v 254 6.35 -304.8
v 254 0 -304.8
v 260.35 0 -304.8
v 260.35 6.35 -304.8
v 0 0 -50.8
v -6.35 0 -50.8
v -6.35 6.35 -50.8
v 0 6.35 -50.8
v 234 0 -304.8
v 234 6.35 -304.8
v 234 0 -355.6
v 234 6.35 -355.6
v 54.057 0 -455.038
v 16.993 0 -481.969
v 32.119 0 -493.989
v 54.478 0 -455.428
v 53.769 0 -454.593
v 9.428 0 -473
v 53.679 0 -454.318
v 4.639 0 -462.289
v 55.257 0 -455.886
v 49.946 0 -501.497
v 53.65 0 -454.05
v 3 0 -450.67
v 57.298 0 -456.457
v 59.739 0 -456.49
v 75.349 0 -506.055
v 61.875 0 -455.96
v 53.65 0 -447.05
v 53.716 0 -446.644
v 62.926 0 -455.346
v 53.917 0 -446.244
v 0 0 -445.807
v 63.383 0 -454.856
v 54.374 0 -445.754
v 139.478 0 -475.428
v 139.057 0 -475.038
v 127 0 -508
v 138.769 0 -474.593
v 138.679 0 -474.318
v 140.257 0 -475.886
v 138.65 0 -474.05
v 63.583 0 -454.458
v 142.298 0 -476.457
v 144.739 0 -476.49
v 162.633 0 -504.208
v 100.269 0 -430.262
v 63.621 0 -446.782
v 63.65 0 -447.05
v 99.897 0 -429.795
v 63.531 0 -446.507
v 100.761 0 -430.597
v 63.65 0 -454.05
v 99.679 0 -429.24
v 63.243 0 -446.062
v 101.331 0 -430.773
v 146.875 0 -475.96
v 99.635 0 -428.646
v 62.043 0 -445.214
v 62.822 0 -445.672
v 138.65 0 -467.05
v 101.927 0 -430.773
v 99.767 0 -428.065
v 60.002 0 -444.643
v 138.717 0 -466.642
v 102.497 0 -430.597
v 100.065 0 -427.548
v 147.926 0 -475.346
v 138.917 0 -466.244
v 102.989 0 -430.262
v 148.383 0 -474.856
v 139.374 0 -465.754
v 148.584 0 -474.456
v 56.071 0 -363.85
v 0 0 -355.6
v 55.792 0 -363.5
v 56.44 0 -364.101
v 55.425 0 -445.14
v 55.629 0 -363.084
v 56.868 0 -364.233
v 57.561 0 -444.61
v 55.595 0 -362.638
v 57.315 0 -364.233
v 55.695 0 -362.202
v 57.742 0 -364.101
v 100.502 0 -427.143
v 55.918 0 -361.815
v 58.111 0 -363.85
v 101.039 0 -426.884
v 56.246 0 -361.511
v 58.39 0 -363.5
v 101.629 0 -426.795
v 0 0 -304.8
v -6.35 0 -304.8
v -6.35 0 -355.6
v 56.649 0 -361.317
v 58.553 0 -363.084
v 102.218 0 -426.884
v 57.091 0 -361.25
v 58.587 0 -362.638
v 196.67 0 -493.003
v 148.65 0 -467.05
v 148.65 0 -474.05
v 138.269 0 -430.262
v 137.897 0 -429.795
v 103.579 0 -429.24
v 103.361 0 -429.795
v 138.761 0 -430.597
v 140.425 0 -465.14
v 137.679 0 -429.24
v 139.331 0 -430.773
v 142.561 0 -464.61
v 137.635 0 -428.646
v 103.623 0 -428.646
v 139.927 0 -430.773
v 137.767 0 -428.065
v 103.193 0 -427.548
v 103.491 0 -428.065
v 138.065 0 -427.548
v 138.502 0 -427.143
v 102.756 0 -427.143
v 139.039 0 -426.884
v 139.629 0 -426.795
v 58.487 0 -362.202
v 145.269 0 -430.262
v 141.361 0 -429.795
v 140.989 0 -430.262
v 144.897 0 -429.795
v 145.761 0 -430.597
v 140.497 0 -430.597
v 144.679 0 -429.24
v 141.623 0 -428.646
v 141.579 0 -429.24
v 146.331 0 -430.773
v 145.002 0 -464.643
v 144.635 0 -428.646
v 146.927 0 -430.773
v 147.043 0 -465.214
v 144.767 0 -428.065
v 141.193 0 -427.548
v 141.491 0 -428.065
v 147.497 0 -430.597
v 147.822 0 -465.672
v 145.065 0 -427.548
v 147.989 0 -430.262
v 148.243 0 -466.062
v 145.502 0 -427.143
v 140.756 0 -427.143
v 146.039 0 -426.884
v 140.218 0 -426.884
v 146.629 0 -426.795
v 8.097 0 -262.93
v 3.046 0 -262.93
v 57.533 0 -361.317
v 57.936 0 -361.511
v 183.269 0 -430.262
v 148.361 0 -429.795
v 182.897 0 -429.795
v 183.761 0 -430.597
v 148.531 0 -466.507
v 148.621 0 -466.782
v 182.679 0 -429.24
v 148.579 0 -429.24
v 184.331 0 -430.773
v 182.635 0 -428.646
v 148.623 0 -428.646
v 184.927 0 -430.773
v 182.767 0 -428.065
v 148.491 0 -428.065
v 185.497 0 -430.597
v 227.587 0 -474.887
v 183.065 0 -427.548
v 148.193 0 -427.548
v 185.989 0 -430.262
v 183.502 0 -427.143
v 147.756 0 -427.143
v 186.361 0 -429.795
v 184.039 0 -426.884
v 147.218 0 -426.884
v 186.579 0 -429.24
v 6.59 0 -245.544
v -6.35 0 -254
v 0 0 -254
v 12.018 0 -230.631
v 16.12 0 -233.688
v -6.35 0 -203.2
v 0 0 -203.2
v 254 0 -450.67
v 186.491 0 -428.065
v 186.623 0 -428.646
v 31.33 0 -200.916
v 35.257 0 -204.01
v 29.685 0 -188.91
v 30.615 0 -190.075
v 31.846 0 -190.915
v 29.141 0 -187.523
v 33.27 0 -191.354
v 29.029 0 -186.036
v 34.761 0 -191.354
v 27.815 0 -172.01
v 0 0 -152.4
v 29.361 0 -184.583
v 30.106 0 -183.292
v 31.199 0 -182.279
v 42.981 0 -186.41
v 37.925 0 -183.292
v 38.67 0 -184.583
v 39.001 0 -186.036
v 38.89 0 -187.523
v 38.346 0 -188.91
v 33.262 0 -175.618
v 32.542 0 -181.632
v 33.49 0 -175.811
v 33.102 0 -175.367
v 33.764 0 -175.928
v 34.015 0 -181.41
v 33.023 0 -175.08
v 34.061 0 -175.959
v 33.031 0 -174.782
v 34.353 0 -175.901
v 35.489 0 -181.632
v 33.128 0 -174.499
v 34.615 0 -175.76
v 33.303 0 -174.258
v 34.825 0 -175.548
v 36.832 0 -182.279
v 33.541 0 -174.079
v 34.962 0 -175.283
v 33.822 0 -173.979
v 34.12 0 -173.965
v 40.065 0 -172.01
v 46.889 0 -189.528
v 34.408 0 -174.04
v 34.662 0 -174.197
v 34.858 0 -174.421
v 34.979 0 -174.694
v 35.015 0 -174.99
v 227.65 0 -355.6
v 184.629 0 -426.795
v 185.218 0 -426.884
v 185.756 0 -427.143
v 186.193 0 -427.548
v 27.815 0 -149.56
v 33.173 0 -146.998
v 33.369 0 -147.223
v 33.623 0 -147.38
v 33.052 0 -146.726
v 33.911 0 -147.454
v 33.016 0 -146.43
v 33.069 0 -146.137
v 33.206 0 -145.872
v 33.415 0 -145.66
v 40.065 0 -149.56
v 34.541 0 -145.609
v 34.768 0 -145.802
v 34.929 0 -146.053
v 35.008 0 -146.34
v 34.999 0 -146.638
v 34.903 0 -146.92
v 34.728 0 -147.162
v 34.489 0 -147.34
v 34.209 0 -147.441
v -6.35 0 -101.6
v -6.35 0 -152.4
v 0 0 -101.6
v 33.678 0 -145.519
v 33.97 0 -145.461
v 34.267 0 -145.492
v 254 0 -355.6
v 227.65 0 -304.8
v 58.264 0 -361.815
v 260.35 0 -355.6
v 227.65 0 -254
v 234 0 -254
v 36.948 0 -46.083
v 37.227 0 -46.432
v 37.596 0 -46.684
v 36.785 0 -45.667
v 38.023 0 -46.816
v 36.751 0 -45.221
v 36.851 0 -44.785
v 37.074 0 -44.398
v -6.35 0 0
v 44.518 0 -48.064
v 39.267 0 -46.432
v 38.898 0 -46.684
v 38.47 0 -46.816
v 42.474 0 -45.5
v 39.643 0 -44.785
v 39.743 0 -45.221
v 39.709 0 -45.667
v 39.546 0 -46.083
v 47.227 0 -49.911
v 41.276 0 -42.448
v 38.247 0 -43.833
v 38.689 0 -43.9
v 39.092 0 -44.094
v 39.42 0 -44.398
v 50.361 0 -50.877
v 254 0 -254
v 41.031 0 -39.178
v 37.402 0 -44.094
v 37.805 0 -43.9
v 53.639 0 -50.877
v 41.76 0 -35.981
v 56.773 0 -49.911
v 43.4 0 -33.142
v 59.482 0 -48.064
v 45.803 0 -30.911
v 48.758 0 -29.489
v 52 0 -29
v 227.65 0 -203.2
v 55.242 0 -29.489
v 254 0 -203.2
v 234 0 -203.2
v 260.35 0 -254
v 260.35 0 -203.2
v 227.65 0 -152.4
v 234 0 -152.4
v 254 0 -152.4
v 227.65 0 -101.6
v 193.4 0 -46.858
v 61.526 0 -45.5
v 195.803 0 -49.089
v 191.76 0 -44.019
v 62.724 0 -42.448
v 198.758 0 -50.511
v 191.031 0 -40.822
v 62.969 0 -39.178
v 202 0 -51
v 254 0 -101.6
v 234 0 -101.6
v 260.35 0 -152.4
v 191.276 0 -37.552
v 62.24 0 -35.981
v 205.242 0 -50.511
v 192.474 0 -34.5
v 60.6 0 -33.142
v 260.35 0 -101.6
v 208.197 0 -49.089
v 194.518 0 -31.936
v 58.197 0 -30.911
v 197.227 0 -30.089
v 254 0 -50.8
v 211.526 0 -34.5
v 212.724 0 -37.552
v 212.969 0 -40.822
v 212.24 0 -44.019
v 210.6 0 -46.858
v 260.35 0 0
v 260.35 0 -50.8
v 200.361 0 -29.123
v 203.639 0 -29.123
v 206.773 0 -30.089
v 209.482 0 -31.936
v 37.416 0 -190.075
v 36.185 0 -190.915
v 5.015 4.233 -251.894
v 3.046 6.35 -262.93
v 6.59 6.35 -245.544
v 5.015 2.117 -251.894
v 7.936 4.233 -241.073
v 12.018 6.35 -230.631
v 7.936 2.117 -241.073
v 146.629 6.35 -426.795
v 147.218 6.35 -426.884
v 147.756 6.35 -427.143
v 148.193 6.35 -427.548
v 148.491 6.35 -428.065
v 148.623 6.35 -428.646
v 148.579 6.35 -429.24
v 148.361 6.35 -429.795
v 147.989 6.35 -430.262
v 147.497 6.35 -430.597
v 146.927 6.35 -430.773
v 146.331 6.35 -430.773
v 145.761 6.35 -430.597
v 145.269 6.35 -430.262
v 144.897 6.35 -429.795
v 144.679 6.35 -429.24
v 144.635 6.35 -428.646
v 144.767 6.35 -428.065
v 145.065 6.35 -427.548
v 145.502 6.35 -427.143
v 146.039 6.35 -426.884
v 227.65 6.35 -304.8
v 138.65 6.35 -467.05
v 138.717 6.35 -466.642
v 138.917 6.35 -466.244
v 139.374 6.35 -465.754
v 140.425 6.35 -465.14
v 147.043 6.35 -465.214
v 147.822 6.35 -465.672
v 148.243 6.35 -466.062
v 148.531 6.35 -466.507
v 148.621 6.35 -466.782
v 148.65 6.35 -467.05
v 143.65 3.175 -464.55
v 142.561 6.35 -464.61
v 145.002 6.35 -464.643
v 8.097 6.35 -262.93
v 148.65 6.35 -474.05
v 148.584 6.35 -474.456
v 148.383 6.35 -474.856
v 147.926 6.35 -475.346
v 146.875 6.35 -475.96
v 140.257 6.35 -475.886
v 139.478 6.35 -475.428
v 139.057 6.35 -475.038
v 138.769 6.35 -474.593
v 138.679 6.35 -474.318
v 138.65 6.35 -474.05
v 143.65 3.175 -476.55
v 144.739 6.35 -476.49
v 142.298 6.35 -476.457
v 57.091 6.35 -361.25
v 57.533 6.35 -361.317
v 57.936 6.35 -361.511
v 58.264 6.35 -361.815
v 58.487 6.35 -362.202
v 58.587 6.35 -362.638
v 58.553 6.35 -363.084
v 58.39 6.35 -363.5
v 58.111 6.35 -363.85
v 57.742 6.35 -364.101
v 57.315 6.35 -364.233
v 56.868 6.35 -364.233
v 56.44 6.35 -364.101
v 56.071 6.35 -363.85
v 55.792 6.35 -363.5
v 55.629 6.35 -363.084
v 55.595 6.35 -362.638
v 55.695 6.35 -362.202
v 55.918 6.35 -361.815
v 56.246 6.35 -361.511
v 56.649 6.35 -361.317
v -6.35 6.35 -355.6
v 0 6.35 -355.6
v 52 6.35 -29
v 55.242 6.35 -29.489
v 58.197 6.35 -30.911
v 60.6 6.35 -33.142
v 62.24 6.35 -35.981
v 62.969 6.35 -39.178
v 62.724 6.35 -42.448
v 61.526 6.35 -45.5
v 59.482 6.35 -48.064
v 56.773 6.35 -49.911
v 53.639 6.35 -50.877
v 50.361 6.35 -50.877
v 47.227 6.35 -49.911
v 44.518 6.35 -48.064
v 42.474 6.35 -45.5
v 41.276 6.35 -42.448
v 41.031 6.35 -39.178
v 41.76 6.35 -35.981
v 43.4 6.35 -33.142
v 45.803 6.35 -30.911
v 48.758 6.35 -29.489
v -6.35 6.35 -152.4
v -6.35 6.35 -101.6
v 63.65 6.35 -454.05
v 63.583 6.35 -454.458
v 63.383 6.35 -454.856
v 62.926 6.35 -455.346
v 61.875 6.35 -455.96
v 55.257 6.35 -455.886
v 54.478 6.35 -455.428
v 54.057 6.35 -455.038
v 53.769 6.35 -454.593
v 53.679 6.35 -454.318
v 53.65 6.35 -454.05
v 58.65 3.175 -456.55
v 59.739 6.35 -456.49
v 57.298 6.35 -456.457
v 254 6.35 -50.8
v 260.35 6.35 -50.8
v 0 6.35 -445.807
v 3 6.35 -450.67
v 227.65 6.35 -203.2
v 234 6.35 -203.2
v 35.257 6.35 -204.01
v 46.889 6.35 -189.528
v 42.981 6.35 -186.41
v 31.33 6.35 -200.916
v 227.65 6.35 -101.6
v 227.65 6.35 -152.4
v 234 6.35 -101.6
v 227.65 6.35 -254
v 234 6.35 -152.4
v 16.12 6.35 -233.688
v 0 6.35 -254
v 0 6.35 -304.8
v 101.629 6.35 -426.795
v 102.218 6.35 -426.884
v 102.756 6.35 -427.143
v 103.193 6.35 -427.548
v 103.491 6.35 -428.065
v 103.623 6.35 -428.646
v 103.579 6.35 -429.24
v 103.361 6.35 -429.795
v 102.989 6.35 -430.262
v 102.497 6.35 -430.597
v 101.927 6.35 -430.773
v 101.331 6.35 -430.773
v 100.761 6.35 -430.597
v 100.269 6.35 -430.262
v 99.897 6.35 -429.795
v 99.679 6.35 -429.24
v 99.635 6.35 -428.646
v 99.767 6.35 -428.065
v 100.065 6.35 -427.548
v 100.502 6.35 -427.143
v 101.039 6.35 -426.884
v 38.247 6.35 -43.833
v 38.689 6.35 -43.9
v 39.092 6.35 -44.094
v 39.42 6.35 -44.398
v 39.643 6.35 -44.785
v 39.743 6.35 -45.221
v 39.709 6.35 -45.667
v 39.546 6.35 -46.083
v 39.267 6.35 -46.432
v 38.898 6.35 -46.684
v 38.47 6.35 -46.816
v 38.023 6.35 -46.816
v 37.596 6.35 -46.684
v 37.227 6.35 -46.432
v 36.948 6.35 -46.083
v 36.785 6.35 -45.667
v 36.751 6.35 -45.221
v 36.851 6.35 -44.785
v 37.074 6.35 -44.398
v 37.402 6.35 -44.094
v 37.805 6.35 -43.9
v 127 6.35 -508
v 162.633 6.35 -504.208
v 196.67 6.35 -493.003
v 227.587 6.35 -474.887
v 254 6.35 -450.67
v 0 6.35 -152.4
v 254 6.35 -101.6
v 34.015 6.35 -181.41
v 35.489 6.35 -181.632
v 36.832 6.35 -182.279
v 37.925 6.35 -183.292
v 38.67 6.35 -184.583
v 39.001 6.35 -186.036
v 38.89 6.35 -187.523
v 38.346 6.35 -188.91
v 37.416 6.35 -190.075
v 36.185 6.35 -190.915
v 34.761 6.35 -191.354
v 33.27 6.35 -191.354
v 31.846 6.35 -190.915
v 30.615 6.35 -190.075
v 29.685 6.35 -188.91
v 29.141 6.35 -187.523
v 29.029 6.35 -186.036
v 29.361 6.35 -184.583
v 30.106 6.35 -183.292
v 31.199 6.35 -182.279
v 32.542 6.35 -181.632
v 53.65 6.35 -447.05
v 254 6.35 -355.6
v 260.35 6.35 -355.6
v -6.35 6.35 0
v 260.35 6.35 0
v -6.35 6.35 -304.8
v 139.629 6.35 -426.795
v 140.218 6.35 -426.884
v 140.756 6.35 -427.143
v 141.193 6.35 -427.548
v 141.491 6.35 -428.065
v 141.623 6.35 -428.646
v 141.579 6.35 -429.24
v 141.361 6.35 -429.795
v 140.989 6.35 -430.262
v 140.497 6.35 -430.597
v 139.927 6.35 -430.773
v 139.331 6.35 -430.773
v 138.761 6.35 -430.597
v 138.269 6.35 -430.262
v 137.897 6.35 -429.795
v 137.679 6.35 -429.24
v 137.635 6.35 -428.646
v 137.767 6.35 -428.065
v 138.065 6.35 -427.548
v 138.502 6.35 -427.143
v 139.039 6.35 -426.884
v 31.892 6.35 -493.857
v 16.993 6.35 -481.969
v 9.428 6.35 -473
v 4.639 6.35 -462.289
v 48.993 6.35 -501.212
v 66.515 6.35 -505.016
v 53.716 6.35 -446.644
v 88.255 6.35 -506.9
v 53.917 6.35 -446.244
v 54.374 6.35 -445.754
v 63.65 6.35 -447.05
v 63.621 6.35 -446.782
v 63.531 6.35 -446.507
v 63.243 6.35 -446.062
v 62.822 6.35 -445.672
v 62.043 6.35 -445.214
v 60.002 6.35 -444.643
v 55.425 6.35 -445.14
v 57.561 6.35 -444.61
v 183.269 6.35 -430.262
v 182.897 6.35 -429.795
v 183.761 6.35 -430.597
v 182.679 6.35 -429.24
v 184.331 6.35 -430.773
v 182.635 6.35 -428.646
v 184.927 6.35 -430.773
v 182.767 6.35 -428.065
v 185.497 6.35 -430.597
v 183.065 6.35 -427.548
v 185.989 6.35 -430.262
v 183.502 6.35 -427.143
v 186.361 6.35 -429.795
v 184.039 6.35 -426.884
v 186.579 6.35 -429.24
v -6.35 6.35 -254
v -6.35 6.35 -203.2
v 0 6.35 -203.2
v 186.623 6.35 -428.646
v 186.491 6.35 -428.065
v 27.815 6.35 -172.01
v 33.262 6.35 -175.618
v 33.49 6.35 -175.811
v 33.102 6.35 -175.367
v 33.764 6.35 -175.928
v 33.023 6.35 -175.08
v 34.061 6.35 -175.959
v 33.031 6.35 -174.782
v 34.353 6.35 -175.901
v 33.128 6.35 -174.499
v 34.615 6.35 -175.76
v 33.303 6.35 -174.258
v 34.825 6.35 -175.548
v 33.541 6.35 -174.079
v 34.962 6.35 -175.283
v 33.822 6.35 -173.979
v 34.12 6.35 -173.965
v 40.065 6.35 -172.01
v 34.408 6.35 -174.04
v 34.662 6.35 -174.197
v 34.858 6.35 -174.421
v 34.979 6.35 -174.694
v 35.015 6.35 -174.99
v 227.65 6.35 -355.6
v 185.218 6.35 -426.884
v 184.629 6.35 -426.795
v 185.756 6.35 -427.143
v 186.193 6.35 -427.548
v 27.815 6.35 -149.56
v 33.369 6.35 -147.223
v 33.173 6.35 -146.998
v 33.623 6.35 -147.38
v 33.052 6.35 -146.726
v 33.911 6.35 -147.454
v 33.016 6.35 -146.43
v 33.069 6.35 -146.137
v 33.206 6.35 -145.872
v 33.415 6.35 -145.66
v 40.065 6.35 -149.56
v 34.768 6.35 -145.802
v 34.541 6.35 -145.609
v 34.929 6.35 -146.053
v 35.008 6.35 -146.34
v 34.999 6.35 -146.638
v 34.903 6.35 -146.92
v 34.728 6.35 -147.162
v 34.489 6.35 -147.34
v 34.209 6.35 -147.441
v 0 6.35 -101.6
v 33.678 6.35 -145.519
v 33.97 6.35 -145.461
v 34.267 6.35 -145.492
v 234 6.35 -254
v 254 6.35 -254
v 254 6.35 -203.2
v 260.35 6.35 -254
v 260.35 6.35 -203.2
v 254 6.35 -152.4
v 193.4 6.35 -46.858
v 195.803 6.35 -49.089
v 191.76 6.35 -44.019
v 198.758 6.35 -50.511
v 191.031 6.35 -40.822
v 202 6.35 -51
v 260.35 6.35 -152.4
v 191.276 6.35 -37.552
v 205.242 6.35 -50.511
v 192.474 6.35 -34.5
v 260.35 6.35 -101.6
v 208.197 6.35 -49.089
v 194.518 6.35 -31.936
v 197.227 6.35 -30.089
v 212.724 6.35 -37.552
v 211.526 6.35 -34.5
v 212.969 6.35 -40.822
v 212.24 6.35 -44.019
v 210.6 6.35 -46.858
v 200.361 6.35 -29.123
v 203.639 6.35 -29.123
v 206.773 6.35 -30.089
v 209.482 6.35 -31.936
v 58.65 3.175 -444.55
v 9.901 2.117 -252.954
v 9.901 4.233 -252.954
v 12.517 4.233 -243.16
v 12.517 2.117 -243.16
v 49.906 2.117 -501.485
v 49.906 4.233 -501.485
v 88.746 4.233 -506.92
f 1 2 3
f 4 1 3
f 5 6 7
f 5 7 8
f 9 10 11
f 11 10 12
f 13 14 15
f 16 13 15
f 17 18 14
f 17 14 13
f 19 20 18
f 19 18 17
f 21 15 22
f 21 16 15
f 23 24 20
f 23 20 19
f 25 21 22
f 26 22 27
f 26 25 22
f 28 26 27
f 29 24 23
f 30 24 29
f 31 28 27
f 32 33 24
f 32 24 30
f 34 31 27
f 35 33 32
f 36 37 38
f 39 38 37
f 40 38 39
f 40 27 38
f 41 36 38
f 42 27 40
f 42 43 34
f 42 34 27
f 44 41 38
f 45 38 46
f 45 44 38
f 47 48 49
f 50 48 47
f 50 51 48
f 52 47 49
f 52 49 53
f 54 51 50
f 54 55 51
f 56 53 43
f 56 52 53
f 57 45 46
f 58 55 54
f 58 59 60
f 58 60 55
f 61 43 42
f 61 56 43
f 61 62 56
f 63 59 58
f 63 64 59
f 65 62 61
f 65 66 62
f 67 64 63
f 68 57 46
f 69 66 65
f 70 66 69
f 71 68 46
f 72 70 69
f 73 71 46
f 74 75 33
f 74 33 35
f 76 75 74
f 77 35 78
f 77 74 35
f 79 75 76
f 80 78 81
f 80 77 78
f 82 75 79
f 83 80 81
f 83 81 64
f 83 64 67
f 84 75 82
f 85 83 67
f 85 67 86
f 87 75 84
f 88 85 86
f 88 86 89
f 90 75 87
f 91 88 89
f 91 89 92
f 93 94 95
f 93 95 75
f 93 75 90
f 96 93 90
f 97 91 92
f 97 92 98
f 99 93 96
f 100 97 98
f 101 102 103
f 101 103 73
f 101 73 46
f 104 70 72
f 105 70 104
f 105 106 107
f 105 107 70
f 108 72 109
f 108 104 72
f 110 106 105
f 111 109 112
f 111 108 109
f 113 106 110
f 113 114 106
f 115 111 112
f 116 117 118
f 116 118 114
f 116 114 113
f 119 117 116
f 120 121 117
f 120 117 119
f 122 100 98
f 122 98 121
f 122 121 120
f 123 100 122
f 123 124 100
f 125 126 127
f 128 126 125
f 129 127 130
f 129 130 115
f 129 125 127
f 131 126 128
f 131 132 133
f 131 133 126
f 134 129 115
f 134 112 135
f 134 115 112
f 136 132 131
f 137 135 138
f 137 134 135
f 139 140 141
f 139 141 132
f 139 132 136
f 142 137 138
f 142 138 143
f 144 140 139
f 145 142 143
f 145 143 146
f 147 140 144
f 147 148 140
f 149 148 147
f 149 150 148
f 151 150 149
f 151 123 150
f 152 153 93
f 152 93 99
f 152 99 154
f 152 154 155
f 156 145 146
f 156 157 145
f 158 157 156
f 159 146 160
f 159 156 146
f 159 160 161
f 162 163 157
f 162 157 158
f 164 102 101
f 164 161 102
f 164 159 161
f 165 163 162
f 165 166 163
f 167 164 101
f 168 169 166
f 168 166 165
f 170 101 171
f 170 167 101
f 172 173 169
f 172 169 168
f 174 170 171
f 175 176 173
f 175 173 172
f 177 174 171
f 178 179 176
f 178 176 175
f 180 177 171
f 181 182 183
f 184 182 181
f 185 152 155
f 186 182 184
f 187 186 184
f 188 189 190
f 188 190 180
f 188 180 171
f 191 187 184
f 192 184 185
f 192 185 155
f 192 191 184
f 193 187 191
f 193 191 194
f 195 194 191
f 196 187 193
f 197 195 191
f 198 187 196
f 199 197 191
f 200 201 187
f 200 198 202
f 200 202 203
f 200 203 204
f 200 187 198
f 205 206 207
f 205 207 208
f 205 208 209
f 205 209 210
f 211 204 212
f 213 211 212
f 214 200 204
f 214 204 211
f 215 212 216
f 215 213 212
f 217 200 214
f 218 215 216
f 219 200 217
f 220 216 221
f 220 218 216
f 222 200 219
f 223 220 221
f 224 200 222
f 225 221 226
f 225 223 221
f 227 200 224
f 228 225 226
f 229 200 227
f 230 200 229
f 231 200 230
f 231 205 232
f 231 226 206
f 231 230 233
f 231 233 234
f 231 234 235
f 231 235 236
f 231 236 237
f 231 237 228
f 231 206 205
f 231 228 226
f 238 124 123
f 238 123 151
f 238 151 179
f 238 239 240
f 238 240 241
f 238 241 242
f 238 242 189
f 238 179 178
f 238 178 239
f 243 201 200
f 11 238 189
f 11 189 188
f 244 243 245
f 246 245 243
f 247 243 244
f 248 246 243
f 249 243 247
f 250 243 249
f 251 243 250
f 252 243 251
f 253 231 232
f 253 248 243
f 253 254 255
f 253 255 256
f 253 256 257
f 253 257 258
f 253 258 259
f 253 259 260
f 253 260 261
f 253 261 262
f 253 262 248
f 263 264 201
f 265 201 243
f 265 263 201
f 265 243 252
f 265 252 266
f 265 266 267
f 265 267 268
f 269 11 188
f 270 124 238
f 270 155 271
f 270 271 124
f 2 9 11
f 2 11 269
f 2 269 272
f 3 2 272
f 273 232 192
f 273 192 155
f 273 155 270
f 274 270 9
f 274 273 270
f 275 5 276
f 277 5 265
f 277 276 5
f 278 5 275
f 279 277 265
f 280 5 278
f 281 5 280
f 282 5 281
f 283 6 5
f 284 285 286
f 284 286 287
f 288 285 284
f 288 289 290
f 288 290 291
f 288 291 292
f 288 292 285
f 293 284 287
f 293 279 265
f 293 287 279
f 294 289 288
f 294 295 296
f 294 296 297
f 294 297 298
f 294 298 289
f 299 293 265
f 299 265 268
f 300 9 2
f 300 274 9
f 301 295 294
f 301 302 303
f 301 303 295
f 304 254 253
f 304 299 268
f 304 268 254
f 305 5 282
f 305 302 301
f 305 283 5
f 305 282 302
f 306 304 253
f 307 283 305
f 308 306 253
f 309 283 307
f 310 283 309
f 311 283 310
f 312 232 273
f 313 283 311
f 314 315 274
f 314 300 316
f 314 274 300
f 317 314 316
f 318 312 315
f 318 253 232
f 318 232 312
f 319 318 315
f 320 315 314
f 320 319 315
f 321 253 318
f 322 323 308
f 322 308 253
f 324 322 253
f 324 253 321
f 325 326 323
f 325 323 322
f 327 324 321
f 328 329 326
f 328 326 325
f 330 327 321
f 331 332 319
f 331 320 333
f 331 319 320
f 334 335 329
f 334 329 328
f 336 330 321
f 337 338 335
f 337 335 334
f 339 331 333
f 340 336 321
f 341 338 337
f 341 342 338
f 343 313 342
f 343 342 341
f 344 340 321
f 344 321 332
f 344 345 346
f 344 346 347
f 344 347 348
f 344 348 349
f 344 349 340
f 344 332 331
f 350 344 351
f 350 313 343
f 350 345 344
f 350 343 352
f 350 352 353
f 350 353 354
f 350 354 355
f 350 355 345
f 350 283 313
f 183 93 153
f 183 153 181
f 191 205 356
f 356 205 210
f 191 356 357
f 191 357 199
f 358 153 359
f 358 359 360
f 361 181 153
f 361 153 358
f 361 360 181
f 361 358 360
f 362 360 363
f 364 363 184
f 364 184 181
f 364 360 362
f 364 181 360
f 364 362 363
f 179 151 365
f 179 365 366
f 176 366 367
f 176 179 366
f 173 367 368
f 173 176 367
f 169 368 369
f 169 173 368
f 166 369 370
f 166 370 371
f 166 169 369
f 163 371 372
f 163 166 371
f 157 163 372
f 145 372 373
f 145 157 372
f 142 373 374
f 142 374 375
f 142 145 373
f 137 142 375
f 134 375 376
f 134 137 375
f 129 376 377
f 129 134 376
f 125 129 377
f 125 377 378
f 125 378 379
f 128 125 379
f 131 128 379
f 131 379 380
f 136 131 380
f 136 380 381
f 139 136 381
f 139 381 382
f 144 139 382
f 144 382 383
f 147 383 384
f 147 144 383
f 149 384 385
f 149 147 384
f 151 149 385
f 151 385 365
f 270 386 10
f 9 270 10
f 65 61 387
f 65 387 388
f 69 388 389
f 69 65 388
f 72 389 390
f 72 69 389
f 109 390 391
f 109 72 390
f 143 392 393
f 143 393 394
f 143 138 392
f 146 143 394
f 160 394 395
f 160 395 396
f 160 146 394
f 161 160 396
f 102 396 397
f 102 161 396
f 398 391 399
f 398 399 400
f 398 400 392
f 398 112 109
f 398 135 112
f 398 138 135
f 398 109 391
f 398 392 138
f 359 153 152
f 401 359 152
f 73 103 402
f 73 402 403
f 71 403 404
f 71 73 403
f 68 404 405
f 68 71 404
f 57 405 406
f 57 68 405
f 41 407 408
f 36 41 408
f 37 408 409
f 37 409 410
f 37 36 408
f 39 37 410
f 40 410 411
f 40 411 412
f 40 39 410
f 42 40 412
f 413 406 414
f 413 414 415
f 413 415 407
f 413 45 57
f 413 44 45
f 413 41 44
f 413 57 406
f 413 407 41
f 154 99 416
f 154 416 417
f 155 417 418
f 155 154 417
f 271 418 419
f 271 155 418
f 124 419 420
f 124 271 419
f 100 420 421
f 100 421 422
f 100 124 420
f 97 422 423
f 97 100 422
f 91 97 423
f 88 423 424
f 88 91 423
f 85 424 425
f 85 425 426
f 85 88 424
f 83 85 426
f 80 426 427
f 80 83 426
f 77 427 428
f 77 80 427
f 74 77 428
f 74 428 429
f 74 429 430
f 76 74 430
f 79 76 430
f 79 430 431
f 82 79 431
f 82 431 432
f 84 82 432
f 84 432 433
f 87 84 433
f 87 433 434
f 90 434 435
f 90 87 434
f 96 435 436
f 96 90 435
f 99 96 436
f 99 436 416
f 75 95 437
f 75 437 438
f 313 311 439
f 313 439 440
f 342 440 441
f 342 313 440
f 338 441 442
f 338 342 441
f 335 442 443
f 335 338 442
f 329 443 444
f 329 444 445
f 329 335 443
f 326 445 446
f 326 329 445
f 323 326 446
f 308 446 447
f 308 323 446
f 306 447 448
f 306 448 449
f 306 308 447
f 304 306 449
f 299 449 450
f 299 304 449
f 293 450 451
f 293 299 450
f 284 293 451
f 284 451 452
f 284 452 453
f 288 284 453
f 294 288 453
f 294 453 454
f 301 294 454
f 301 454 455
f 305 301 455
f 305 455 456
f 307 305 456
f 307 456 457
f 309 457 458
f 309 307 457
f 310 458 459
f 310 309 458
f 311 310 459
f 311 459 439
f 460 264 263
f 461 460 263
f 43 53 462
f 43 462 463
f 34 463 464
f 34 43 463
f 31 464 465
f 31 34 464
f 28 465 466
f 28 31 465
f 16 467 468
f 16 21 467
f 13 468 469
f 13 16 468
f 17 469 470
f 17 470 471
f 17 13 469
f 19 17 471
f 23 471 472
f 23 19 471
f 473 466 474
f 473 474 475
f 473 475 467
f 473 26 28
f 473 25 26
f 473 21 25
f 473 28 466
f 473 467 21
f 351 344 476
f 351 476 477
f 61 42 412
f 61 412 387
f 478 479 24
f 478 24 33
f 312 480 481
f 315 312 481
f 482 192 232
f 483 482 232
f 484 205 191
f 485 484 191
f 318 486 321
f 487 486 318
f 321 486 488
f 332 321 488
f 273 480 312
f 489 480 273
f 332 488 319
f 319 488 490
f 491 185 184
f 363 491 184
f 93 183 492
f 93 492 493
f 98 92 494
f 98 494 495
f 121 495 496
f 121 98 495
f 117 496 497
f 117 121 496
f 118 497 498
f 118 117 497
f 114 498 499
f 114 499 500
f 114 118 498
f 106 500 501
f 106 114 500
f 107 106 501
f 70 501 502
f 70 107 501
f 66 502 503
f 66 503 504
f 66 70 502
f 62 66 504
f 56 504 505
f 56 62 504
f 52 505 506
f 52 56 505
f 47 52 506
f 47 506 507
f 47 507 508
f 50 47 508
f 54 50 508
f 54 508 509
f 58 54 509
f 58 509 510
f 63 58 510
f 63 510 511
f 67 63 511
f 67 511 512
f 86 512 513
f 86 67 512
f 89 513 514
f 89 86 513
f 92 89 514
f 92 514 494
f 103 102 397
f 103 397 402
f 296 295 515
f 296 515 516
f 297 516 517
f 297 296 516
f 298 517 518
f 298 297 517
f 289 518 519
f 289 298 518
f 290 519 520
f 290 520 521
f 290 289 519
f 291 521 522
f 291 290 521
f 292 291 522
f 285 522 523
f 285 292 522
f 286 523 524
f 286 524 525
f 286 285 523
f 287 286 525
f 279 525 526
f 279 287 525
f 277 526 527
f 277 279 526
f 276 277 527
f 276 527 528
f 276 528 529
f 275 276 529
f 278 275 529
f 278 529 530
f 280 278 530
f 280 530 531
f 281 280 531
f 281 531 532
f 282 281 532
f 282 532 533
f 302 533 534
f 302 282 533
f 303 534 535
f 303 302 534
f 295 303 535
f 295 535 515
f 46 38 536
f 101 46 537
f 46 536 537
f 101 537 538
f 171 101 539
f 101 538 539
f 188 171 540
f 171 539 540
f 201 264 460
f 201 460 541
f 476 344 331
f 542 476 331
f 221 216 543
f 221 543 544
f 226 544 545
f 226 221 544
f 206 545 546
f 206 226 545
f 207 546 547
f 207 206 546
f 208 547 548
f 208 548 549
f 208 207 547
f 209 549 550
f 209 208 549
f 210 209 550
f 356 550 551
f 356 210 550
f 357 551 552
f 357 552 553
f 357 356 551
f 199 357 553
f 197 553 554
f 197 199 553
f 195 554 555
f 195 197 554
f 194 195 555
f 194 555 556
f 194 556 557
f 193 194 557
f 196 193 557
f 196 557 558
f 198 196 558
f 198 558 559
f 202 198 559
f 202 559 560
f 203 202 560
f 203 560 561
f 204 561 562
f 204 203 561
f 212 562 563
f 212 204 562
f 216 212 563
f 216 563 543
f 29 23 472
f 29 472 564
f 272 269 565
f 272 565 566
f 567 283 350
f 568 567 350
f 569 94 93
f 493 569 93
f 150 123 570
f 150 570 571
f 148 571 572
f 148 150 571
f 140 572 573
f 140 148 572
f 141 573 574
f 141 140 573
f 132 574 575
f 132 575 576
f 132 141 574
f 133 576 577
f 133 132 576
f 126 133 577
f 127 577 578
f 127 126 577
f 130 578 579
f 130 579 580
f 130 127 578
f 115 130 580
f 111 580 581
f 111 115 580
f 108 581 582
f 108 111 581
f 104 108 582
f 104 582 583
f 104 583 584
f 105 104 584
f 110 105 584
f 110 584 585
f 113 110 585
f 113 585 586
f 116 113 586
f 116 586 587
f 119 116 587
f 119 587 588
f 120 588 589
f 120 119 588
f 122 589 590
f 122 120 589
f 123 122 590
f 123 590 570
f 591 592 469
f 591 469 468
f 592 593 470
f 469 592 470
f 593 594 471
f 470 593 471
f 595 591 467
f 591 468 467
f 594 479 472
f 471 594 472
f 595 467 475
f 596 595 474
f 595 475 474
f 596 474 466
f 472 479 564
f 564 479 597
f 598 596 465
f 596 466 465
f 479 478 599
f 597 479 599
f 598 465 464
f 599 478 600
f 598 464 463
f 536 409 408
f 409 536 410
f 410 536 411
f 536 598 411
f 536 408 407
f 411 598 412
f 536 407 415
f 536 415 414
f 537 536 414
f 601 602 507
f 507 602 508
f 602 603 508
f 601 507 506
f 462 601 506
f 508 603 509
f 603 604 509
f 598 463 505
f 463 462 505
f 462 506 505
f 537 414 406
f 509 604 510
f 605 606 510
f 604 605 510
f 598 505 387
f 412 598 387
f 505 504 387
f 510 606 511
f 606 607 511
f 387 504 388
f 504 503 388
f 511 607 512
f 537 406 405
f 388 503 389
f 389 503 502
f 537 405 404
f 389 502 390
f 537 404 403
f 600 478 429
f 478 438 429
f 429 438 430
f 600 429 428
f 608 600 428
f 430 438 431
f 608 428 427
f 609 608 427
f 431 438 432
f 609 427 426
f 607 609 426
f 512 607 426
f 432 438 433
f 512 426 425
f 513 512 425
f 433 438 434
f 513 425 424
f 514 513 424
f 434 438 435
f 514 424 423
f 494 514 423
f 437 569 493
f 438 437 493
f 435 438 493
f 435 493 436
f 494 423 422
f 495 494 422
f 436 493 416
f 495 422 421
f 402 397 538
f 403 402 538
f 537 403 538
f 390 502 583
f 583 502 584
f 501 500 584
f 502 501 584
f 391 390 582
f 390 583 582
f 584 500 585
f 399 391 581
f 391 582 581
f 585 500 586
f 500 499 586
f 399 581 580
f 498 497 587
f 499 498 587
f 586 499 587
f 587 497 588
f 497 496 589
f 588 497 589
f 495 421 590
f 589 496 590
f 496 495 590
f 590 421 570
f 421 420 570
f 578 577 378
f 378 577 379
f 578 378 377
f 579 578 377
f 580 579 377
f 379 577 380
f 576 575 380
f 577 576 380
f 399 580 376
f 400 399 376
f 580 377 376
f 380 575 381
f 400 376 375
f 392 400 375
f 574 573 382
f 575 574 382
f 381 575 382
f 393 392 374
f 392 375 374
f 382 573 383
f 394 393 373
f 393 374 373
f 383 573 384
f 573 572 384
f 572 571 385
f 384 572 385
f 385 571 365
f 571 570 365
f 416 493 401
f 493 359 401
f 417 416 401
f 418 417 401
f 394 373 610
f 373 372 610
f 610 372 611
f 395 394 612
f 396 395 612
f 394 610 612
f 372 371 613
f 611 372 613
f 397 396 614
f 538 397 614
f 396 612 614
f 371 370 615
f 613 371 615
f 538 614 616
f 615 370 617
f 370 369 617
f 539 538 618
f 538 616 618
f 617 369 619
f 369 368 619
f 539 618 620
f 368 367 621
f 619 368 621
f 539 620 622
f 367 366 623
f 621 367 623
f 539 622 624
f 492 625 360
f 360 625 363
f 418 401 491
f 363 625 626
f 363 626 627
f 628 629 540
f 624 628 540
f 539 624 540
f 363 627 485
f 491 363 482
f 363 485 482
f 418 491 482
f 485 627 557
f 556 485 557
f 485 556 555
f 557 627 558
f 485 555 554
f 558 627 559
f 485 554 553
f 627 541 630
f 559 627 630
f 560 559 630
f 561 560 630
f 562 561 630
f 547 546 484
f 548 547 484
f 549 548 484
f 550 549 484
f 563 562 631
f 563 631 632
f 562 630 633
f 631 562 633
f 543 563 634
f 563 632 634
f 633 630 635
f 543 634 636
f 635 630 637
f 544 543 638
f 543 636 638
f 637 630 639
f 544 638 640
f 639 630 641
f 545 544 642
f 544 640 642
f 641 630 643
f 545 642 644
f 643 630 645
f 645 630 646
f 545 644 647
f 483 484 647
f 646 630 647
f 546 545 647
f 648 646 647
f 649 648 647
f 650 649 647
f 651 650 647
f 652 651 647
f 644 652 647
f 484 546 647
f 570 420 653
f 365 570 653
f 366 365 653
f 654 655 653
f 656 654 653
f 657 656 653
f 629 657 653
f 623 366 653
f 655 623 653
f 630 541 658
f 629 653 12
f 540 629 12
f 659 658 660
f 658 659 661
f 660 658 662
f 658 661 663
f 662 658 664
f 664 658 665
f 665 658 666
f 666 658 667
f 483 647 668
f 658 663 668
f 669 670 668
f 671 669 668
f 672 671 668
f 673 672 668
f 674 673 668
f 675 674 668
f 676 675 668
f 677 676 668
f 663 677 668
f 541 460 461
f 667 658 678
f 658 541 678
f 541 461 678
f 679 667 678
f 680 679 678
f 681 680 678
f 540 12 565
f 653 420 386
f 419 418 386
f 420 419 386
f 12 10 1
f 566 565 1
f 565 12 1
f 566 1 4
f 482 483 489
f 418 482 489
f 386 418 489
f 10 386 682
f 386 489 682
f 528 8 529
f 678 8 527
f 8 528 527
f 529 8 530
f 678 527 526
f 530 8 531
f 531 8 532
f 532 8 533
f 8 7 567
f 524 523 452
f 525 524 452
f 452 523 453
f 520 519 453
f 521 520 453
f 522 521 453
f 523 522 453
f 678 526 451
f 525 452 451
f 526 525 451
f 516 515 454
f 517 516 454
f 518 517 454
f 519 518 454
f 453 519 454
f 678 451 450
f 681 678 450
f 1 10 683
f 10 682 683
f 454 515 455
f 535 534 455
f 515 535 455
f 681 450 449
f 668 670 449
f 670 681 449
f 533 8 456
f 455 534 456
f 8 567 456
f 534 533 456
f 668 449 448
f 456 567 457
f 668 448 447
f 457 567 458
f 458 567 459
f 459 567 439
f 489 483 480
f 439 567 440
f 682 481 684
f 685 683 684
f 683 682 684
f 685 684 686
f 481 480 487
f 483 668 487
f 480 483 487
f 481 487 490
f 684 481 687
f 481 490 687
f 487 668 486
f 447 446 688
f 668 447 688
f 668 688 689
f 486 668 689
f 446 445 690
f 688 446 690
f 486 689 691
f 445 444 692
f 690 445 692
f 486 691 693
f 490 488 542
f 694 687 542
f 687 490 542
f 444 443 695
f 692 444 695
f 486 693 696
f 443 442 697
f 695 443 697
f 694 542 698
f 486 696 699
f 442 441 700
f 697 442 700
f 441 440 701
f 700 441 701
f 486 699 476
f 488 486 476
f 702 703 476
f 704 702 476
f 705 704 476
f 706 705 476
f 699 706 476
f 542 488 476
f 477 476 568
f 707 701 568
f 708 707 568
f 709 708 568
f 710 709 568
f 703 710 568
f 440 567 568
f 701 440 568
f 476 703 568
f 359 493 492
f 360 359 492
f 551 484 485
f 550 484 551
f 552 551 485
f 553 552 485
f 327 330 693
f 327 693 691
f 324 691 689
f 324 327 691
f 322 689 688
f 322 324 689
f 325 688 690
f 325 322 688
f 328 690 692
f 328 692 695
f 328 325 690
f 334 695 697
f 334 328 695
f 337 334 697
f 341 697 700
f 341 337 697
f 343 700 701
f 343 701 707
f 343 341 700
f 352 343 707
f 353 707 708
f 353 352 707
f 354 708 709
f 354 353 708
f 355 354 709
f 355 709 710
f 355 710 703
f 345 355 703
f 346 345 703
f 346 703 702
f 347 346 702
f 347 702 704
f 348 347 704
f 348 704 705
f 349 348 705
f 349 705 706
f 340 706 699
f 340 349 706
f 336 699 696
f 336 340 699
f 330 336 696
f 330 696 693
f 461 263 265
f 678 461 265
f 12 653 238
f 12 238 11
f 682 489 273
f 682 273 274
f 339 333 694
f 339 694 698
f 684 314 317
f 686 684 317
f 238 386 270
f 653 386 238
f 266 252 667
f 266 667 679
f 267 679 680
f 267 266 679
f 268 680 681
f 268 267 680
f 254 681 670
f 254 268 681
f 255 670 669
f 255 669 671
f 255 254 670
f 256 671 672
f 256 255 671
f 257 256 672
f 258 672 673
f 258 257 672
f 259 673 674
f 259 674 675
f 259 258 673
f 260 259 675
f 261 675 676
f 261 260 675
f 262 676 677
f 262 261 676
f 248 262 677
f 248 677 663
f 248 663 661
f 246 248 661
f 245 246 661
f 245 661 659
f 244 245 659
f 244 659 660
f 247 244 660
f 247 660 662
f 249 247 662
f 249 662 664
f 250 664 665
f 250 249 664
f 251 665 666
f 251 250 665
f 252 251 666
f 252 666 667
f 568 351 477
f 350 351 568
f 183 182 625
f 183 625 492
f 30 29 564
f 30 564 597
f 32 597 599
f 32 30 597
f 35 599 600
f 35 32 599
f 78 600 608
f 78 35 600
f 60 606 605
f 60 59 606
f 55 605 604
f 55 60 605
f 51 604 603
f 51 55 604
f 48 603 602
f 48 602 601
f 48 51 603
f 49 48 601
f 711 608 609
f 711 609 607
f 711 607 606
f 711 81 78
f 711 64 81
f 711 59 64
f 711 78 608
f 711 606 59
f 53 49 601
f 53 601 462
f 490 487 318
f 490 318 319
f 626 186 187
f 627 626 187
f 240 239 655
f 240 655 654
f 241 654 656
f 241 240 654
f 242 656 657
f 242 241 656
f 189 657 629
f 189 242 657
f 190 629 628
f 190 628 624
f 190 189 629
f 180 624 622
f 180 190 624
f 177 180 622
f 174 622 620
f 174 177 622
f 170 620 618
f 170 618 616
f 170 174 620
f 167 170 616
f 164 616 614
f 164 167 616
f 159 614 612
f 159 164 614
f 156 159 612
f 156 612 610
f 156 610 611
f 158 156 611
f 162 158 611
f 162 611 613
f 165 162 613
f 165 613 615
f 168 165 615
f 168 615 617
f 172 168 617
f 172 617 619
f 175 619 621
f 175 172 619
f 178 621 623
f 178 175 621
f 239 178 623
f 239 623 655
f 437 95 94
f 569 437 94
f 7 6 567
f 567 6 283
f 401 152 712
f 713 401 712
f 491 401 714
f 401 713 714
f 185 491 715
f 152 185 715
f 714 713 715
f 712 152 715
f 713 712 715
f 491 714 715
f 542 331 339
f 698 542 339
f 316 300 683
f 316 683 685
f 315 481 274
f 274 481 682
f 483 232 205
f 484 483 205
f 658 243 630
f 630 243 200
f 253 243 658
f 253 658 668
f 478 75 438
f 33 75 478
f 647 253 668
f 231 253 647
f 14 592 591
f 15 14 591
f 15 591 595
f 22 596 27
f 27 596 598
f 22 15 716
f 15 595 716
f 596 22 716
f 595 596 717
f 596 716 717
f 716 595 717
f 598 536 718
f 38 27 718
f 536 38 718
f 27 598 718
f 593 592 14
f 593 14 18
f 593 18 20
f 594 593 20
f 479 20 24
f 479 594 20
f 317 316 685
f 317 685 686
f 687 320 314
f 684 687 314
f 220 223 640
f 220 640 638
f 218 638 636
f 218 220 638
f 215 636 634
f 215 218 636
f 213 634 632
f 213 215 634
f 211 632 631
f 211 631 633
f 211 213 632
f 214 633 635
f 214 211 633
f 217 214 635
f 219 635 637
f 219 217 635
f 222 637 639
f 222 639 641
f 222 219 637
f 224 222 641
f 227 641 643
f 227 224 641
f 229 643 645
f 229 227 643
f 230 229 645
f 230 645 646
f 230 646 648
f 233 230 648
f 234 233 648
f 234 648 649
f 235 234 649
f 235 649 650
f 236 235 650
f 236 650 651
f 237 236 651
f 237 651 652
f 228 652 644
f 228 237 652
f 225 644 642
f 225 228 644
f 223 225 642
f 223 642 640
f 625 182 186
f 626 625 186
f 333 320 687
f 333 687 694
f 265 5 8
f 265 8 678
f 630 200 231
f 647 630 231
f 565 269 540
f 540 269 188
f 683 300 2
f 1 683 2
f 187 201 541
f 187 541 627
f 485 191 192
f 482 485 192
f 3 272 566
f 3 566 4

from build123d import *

# Parameters (mm, degrees)
SKETCH2_W           = 254
SKETCH2_H           = 508
SKETCH2_R           = 11
SKETCH2_R_2         = 1.5
SKETCH2_R_3         = 5
SKETCH2_R_4         = 2
SKETCH2_W_2         = 12.25
SKETCH2_H_2         = 22.45
BOSS_EXTRUDE1_DEPTH = 6.35
CUT_EXTRUDE1_REACH  = 569.997
CUT_EXTRUDE2_REACH  = 569.997
SKETCH7_W           = 6.35
SKETCH7_H           = 50.8
BOSS_EXTRUDE2_DEPTH = 6.35
LPATTERN1_COUNT     = 4
LPATTERN1_PITCH     = 101.6
CUT_EXTRUDE3_REACH  = 572.865
SKETCH8_W           = 6.35
SKETCH8_H           = 50.8
LPATTERN2_COUNT     = 3
LPATTERN2_PITCH     = 101.6


with BuildPart() as part:
    # Sketch2 → Boss-Extrude1 (new body)
    with BuildSketch(Plane(origin=(0, 0, 0), x_dir=(1, 0, 0), z_dir=(0, 1, 0))):
        with Locations((127, 254)):
            Rectangle(SKETCH2_W, SKETCH2_H)
        with Locations(Location((52, 40, 0), (0, 0, 270))):
            Circle(SKETCH2_R, mode=Mode.SUBTRACT)
        with Locations(Location((202, 40, 0), (0, 0, 90))):
            Circle(SKETCH2_R, mode=Mode.SUBTRACT)
        with Locations(Location((38.246918035, 45.332917816, 0), (0, 0, 270))):
            Circle(SKETCH2_R_2, mode=Mode.SUBTRACT)
        with Locations(Location((34.015423002, 186.409908658, 0), (0, 0, 270))):
            Circle(SKETCH2_R_3, mode=Mode.SUBTRACT)
        with Locations(Location((57.09109314, 362.75, 0), (0, 0, 270))):
            Circle(SKETCH2_R_2, mode=Mode.SUBTRACT)
        with Locations(Location((184.628948138, 428.795408939, 0), (0, 0, 270))):
            Circle(SKETCH2_R_4, mode=Mode.SUBTRACT)
        with Locations(Location((146.628948138, 428.795408939, 0), (0, 0, 270))):
            Circle(SKETCH2_R_4, mode=Mode.SUBTRACT)
        with Locations(Location((139.628948138, 428.795408939, 0), (0, 0, 270))):
            Circle(SKETCH2_R_4, mode=Mode.SUBTRACT)
        with Locations(Location((101.628948138, 428.795408939, 0), (0, 0, 270))):
            Circle(SKETCH2_R_4, mode=Mode.SUBTRACT)
        with BuildLine():
            Line((3.046441744, 262.929522506), (8.097429065, 262.929522506))
            add(Edge.make_bspline(
                [(8.097429065, 262.929522506), (9.552300843, 252.9110337), (11.964991372, 242.951994092), (16.119595939, 233.68781707)],
                knots=[0, 0, 0, 0, 1, 1, 1, 1], degree=3))
            Line((16.119595939, 233.68781707), (12.017665952, 230.63111289))
            add(Edge.make_bspline(
                [(3.046441744, 262.929522506), (4.60754392, 251.841244803), (7.285656471, 240.828405001), (12.017665952, 230.63111289)],
                knots=[0, 0, 0, 0, 1, 1, 1, 1], degree=3))
        make_face(mode=Mode.SUBTRACT)
        Polygon((31.329859517, 200.915527121), (35.257076266, 204.010194891), (46.889107588, 189.528125605), (42.980562709, 186.409908658), align=None, mode=Mode.SUBTRACT)
        with Locations((33.940423002, 160.784908658)):
            Rectangle(SKETCH2_W_2, SKETCH2_H_2, mode=Mode.SUBTRACT)
        with BuildLine():
            Line((138.65, 474.05), (138.65, 467.05))
            add(Edge.make_bspline(
                [(138.65, 467.05), (138.65, 464.55), (143.65, 464.55), (148.65, 464.55), (148.65, 467.05)],
                knots=[0, 0, 0, 1.570796327, 1.570796327, 3.141592654, 3.141592654, 3.141592654], degree=2, weights=[1, 0.707106781, 1, 0.707106781, 1]))
            Line((148.65, 467.05), (148.65, 474.05))
            add(Edge.make_bspline(
                [(148.65, 474.05), (148.65, 476.55), (143.65, 476.55), (138.65, 476.55), (138.65, 474.05)],
                knots=[3.141592654, 3.141592654, 3.141592654, 4.71238898, 4.71238898, 6.283185307, 6.283185307, 6.283185307], degree=2, weights=[1, 0.707106781, 1, 0.707106781, 1]))
        make_face(mode=Mode.SUBTRACT)
        with BuildLine():
            Line((63.65, 447.05), (63.65, 454.05))
            add(Edge.make_bspline(
                [(63.65, 454.05), (63.65, 456.55), (58.65, 456.55), (53.65, 456.55), (53.65, 454.05)],
                knots=[0, 0, 0, 1.570796327, 1.570796327, 3.141592654, 3.141592654, 3.141592654], degree=2, weights=[1, 0.707106781, 1, 0.707106781, 1]))
            Line((53.65, 454.05), (53.65, 447.05))
            add(Edge.make_bspline(
                [(53.65, 447.05), (53.65, 444.55), (58.65, 444.55), (63.65, 444.55), (63.65, 447.05)],
                knots=[3.141592654, 3.141592654, 3.141592654, 4.71238898, 4.71238898, 6.283185307, 6.283185307, 6.283185307], degree=2, weights=[1, 0.707106781, 1, 0.707106781, 1]))
        make_face(mode=Mode.SUBTRACT)
        with BuildLine():
            ThreePointArc((33.415423002, 175.759908658), (34.015423002, 173.959908658), (34.615423002, 175.759908658))
            ThreePointArc((34.615423002, 175.759908658), (34.015423002, 175.959908658), (33.415423002, 175.759908658))
        make_face(mode=Mode.SUBTRACT)
        with BuildLine():
            ThreePointArc((34.615423002, 145.659908658), (34.015423002, 147.459908658), (33.415423002, 145.659908658))
            ThreePointArc((33.415423002, 145.659908658), (34.015423002, 145.459908658), (34.615423002, 145.659908658))
        make_face(mode=Mode.SUBTRACT)
    extrude(amount=BOSS_EXTRUDE1_DEPTH)

    # Sketch3 → Cut-Extrude1 (cut, up to next)
    with BuildSketch(Plane(origin=(0, 6.35, 0), x_dir=(1, 0, 0), z_dir=(0, 1, 0)), mode=Mode.PRIVATE) as cut_extrude1_sk1:
        with BuildLine():
            Line((254, 508), (127, 508))
            ThreePointArc((127, 508), (196.670138835, 493.003472168), (254, 450.670138835))
            Line((254, 450.670138835), (254, 508))
        make_face()
    cut_extrude1_tool1 = extrude(cut_extrude1_sk1.sketch, amount=-CUT_EXTRUDE1_REACH, mode=Mode.PRIVATE) & part.part
    add(cut_extrude1_tool1.solids().sort_by_distance((223.425214, 6.35, -491.44845))[0], mode=Mode.SUBTRACT)

    # Sketch5 → Cut-Extrude2 (cut, up to next)
    with BuildSketch(Plane(origin=(0, 6.35, 0), x_dir=(1, 0, 0), z_dir=(0, 1, 0)), mode=Mode.PRIVATE) as cut_extrude2_sk1:
        with BuildLine():
            Line((3, 450.670138835), (0, 445.807083784))
            Line((0, 445.807083784), (0, 508))
            Line((0, 508), (0, 526.766169575))
            Line((0, 526.766169575), (127, 526.766169575))
            Line((127, 526.766169575), (127, 508))
            add(Edge.make_bspline(
                [(16.993362097, 481.969152132), (44.771100023, 511.766098677), (91.209279055, 505.856564635), (127, 508)],
                knots=[0, 0, 0, 0, 1, 1, 1, 1], degree=3))
            ThreePointArc((16.993362097, 481.969152132), (6.657603153, 467.812501684), (3, 450.670138835))
        make_face()
    cut_extrude2_tool1 = extrude(cut_extrude2_sk1.sketch, amount=-CUT_EXTRUDE2_REACH, mode=Mode.PRIVATE) & part.part
    add(cut_extrude2_tool1.solids().sort_by_distance((49.030169, 6.35, -509.000401))[0], mode=Mode.SUBTRACT)

    # Sketch7 → Boss-Extrude2 (add)
    with BuildSketch(Plane.XZ):
        with Locations((257.175, -25.4)):
            Rectangle(SKETCH7_W, SKETCH7_H)
        with Locations((-3.175, -25.4)):
            Rectangle(SKETCH7_W, SKETCH7_H)
    boss_extrude2 = extrude(amount=-BOSS_EXTRUDE2_DEPTH)

    # LPattern1: Boss-Extrude2 ×4
    with Locations(*[(0, 0, -i * LPATTERN1_PITCH) for i in range(1, LPATTERN1_COUNT)]):
        add(boss_extrude2)

    # Sketch8 → Cut-Extrude3 (cut, up to next)
    with BuildSketch(Plane(origin=(0, 6.35, 0), x_dir=(1, 0, 0), z_dir=(0, 1, 0)), mode=Mode.PRIVATE) as cut_extrude3_sk1:
        with Locations((230.825, 127)):
            Rectangle(SKETCH8_W, SKETCH8_H)
    cut_extrude3_tool1 = extrude(cut_extrude3_sk1.sketch, amount=-CUT_EXTRUDE3_REACH, mode=Mode.PRIVATE) & part.part
    cut_extrude3 = cut_extrude3_tool1.solids().sort_by_distance((230.825, 6.35, -127))[0]
    add(cut_extrude3, mode=Mode.SUBTRACT)

    # LPattern2: Cut-Extrude3 ×3
    with Locations(*[(0, 0, -i * LPATTERN2_PITCH) for i in range(1, LPATTERN2_COUNT)]):
        add(cut_extrude3, mode=Mode.SUBTRACT)


solid = part.part
